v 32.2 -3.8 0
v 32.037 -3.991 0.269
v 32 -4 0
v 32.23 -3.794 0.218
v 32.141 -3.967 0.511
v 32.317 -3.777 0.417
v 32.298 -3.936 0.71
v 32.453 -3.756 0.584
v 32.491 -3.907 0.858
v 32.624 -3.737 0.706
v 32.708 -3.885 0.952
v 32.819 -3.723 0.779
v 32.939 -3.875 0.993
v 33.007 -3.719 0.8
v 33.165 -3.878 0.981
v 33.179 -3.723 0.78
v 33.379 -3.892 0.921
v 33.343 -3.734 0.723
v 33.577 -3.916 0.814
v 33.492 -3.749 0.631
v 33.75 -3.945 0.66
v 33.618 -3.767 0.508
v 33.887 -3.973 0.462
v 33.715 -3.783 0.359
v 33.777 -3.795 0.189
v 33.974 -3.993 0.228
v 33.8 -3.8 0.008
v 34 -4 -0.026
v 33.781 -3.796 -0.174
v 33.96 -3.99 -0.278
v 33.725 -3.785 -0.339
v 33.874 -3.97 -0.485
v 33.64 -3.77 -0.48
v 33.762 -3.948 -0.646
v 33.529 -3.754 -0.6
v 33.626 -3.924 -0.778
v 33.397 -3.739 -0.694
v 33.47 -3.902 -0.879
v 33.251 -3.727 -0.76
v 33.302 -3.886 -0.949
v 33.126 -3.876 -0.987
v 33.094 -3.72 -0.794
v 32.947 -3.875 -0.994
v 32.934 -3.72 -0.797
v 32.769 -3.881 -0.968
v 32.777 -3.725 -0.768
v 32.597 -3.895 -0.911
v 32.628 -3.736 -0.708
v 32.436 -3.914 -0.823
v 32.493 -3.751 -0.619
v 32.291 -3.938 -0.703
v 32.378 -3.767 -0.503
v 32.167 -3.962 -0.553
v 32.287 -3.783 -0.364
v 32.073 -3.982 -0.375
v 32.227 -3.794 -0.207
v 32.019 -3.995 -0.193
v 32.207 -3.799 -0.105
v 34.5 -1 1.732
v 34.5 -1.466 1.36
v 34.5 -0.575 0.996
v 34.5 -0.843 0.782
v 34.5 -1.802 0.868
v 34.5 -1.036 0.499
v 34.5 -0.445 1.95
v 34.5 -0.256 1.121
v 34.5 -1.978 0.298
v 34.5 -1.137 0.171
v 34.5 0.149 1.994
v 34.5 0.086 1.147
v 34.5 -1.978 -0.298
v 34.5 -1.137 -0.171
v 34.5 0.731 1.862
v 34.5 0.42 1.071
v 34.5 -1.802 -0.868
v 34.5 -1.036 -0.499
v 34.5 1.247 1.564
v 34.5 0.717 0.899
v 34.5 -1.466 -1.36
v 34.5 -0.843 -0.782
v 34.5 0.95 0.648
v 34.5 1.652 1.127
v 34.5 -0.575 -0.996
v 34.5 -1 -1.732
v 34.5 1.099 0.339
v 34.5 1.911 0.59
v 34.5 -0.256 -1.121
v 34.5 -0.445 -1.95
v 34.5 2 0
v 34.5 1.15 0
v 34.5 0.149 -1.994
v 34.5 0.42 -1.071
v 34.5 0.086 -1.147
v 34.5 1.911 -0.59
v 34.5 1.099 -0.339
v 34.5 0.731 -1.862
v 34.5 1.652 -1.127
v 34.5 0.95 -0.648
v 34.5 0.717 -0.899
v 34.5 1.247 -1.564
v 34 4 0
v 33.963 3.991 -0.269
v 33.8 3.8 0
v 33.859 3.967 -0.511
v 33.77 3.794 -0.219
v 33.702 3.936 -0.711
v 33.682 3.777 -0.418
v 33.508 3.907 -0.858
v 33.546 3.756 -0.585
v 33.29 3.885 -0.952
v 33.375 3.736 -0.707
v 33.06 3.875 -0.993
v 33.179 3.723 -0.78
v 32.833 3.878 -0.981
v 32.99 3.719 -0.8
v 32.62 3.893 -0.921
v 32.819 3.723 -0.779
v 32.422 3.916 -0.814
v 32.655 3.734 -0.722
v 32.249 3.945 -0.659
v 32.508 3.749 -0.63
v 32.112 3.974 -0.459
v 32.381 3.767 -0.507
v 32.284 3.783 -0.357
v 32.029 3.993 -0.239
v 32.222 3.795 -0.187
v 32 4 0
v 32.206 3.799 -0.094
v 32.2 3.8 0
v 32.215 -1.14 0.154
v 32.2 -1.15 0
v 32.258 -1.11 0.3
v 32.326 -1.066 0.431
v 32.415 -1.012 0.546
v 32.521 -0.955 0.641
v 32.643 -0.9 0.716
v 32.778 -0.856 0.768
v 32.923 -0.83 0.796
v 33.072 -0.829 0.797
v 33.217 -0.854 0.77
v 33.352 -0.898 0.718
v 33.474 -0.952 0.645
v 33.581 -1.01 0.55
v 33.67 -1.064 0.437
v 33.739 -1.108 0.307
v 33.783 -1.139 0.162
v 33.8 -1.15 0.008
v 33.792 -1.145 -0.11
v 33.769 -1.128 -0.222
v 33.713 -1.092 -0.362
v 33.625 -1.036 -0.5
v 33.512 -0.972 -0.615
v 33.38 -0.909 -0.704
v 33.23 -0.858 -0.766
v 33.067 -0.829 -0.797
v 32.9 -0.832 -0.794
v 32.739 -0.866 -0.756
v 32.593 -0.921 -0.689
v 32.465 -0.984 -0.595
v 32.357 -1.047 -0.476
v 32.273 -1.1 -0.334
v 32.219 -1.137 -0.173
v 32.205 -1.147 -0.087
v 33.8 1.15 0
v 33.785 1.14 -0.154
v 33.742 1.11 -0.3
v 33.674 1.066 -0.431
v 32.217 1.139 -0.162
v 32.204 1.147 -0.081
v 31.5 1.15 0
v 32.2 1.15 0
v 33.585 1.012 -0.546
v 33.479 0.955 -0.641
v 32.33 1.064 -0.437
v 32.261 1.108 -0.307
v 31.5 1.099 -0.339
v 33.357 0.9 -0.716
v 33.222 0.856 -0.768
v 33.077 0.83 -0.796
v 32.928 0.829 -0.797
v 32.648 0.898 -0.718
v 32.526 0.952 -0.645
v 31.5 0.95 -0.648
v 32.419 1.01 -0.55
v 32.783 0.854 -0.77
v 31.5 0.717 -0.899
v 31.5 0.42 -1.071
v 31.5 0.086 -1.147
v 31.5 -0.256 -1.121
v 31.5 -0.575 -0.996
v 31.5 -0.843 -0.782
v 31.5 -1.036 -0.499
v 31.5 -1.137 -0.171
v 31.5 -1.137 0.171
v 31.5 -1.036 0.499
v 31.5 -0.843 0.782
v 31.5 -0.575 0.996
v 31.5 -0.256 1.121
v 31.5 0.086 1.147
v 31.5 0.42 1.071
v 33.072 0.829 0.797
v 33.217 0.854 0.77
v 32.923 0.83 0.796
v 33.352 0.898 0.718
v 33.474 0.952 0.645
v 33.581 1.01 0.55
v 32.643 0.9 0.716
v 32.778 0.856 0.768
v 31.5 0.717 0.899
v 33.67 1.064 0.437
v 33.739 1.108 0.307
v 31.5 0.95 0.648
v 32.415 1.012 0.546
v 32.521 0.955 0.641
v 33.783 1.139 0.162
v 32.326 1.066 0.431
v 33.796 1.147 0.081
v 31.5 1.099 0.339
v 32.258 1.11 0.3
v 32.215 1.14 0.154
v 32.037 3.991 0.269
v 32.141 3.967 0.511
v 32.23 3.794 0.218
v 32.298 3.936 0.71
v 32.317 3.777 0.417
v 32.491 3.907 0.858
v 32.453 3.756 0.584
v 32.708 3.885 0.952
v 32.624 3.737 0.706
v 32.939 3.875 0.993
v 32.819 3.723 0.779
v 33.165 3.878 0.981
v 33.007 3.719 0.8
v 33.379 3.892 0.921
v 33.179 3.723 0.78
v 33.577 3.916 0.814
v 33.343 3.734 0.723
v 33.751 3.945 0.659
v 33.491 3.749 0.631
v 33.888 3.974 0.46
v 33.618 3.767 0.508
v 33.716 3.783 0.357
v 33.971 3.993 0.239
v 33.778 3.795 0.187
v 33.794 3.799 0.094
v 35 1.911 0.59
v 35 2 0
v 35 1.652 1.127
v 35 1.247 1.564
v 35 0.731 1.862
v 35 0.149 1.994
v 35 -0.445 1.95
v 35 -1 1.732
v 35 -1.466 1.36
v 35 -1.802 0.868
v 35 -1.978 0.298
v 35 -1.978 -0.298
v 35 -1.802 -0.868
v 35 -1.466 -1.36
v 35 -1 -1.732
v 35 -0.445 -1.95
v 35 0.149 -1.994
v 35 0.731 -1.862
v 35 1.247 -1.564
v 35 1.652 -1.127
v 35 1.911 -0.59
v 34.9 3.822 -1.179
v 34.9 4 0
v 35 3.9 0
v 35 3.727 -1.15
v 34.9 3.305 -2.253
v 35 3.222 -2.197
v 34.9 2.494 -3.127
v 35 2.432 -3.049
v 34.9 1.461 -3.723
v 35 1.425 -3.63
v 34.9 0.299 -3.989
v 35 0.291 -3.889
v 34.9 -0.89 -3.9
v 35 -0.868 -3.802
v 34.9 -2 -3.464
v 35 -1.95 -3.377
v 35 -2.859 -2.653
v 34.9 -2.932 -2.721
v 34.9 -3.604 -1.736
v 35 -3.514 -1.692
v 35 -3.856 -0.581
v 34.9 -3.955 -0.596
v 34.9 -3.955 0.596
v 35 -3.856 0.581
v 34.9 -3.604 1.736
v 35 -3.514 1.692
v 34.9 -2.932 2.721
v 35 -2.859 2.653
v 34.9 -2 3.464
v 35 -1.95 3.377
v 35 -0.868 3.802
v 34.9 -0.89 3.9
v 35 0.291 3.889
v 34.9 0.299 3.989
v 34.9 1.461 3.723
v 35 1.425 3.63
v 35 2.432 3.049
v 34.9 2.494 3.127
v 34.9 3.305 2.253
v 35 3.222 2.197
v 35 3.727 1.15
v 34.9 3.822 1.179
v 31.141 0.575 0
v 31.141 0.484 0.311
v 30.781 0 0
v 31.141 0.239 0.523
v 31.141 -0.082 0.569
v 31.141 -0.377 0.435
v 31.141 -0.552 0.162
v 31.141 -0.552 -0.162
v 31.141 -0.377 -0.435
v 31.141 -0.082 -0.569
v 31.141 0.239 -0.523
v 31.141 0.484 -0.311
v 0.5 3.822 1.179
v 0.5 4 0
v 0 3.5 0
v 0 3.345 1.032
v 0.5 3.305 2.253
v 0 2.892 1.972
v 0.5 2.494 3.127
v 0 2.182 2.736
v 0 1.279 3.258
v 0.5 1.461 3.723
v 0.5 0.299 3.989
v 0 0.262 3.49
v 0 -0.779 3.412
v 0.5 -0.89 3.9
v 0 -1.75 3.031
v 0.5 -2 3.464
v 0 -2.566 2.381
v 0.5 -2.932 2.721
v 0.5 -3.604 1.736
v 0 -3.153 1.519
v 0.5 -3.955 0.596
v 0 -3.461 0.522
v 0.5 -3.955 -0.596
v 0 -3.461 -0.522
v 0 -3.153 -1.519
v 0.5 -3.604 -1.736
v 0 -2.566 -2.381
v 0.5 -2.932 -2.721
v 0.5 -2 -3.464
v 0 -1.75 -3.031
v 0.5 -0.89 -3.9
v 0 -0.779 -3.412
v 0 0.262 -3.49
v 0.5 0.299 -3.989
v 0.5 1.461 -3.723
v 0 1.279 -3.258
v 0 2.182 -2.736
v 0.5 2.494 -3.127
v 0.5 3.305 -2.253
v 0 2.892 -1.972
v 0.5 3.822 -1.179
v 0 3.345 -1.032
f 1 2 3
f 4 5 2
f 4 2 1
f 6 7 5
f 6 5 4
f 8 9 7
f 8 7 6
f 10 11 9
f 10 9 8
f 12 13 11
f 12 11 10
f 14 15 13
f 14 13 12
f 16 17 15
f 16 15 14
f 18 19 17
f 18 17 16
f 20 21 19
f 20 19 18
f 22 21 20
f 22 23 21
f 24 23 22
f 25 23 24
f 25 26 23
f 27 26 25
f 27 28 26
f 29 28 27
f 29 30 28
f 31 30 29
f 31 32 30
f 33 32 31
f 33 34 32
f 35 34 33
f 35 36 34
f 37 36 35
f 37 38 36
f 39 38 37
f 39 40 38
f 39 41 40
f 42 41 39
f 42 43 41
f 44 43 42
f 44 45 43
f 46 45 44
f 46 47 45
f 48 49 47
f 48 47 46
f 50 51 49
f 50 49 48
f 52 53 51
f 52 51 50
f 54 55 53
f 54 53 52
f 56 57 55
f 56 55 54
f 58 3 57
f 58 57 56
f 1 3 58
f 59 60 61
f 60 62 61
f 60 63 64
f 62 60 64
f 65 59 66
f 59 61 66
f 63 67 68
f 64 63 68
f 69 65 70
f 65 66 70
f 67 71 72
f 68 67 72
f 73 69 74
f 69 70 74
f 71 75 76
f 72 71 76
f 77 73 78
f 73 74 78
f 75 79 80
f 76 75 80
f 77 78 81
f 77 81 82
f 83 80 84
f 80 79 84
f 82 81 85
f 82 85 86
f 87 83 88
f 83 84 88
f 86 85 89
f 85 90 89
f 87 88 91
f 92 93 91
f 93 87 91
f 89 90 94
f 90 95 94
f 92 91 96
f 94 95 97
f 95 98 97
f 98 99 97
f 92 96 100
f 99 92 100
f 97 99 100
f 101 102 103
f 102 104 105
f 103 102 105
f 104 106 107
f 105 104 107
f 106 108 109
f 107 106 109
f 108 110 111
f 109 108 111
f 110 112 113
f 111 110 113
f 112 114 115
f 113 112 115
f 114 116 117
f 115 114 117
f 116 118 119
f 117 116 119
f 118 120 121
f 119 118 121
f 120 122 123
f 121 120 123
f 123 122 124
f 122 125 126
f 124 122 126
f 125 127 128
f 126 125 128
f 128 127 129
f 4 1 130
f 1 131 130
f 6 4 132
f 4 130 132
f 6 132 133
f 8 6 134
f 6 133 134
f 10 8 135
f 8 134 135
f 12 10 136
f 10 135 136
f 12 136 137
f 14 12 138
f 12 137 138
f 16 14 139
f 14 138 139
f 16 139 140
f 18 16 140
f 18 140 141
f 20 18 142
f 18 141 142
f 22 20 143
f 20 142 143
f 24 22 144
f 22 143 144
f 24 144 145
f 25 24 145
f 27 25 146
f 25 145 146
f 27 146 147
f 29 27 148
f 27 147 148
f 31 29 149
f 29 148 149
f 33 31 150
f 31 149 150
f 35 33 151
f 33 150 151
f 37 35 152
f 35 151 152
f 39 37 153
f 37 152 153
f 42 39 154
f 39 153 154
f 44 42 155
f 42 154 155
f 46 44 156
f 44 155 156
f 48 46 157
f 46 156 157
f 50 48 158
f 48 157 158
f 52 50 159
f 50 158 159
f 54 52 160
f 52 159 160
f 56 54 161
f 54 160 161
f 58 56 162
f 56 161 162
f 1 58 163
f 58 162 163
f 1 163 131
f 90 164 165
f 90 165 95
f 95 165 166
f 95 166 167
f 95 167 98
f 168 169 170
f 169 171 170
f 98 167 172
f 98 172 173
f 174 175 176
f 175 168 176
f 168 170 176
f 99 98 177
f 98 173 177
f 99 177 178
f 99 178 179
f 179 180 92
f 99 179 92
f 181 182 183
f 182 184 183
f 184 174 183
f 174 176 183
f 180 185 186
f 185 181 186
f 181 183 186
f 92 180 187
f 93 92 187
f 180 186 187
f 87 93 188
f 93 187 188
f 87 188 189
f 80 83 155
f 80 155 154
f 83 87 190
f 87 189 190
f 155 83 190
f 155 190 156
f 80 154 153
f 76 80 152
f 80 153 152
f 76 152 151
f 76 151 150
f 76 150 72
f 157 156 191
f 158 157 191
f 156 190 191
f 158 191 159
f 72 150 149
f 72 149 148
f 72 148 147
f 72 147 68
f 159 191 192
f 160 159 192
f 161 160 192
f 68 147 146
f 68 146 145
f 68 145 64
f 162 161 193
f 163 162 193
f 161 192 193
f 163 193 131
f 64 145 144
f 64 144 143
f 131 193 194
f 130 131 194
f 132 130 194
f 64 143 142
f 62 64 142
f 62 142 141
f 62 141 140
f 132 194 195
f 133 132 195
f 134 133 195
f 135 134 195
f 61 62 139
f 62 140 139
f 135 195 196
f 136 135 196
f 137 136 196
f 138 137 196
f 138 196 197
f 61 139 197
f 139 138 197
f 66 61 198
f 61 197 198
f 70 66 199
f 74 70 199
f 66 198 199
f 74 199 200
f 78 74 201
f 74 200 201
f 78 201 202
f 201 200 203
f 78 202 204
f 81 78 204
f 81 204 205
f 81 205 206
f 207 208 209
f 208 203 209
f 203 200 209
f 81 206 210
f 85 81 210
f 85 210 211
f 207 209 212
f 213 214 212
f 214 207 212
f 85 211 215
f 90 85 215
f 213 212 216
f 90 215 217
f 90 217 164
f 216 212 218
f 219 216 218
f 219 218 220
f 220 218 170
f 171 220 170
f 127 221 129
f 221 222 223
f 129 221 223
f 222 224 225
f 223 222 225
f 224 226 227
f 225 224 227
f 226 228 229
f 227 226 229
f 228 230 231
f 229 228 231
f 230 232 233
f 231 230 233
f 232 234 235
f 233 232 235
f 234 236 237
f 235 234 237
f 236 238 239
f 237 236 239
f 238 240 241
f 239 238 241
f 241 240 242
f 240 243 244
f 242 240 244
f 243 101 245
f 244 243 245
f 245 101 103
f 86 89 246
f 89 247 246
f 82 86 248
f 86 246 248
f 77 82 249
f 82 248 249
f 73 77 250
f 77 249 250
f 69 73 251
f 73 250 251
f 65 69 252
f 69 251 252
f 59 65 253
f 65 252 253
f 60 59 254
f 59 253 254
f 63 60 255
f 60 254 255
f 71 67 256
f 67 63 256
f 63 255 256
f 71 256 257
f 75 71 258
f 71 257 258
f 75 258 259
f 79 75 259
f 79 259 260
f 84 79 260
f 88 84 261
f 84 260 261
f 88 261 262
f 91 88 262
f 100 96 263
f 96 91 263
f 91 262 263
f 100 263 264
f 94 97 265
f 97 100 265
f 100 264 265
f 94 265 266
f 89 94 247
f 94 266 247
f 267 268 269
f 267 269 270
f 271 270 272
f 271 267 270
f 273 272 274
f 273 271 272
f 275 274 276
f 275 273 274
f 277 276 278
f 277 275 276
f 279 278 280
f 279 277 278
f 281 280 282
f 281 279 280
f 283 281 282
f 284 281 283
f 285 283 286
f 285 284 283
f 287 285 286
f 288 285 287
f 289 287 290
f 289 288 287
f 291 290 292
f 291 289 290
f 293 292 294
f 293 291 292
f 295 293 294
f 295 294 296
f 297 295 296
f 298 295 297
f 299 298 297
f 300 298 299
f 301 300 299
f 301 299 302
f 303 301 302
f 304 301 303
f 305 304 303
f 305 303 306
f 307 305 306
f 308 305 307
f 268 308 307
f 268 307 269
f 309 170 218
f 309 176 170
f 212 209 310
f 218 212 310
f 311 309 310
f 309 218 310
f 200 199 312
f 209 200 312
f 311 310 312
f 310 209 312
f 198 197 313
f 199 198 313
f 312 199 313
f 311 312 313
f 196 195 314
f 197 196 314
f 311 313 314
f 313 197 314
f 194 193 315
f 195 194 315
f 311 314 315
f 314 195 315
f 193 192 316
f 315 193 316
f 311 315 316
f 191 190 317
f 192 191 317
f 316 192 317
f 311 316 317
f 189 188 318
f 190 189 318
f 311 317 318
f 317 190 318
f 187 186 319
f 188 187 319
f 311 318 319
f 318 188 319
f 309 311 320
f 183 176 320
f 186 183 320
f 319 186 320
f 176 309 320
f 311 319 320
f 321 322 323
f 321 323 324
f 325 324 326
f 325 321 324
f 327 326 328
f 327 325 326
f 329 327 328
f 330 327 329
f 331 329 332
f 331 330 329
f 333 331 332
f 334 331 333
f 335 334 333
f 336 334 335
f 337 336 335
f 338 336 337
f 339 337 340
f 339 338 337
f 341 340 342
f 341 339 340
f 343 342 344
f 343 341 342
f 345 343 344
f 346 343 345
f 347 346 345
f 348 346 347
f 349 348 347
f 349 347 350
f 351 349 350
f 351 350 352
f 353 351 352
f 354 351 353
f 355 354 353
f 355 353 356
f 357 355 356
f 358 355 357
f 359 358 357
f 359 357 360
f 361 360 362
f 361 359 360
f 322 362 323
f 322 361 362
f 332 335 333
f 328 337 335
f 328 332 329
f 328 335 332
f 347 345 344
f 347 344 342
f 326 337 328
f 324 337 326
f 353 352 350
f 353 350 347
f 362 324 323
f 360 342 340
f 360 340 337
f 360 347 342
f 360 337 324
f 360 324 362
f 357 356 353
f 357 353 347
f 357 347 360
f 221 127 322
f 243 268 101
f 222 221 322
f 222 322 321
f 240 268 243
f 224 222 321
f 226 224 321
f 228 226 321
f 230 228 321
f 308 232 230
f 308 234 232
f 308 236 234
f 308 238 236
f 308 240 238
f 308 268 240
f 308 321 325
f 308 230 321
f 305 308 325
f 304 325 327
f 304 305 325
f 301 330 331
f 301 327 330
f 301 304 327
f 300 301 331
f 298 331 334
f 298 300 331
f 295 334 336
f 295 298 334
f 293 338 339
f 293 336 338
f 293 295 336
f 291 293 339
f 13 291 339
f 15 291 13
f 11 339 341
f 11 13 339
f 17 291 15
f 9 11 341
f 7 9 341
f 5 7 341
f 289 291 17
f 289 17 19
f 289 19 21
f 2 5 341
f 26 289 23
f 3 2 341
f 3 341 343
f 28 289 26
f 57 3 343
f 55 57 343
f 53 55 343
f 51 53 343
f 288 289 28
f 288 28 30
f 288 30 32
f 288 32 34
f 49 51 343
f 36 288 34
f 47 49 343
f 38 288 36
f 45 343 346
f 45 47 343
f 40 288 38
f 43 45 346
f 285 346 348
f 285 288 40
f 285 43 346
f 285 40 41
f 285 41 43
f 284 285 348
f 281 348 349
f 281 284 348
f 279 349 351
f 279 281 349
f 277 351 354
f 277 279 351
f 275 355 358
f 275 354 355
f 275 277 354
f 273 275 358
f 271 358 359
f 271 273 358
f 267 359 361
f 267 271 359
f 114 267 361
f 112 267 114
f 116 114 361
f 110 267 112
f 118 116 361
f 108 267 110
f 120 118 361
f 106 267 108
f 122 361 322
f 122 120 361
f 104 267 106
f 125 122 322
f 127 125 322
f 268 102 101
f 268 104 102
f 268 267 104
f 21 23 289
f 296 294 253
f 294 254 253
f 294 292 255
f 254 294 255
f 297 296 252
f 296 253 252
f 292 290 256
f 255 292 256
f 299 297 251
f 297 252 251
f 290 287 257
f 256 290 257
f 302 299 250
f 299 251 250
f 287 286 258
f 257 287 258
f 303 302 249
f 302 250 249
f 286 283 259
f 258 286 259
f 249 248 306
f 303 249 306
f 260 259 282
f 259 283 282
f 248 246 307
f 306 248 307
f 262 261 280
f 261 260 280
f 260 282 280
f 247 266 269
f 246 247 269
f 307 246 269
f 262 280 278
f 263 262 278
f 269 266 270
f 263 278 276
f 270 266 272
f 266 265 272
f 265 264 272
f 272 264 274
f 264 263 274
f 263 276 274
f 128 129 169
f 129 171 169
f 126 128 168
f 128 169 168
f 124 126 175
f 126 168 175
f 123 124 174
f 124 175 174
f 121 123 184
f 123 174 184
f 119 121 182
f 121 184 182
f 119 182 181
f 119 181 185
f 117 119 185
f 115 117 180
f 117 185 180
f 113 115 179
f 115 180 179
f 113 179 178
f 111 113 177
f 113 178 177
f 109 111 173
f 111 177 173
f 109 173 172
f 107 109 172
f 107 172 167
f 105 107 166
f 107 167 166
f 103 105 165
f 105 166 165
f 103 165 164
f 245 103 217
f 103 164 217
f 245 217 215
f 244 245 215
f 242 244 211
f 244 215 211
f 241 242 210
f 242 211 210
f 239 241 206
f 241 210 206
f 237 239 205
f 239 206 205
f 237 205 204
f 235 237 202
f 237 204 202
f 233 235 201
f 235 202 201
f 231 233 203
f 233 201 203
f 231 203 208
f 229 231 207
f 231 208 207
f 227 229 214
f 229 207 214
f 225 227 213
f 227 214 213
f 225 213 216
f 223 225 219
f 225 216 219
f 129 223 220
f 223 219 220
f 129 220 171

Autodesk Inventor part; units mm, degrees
ref_plane "YZ Plane" through (0, 0, 0) normal (1, 0, 0) x (0, 1, 0)
ref_plane "XZ Plane" through (0, 0, 0) normal (0, 1, 0) x (-1, 0, 0)
ref_plane "XY Plane" through (0, 0, 0) normal (0, 0, 1) x (1, 0, 0)
sketch "Sketch1" plane through (0, 0, 0) normal (0, 0, 1) x (1, 0, 0)
  line L0 (0, 0) -> (0, 3)
  line L1 (0, 3) -> (15, 3)
  line L2 (15, 3) -> (15, 4)
  line L3 (15, 4) -> (35, 4)
  line L4 (35, 4) -> (35, 0)
  line L5 (35, 0) -> (0, 0)
  line L6 (34.5, 0) -> (34.5, 2)
  line L7 (34.5, 2) -> (35, 2)
  line L8 (34.5, 1.15) -> (31.5, 1.15)
  line L9 (31.5, 1.15) -> (30.7814, 0)
  line L10 (30.7814, 0) -> (34.5, 0)
  line L11 (15, 4) -> (0, 4)
  line L12 (0, 4) -> (0, 3)
  point P0 (0, 1.5)
  point P1 (35, 2)
  dimension "d0" = 3
  dimension "d1" = 4
  dimension "d2" = 15
  dimension "d3" = 35
  dimension "d4" = 2
  dimension "d5" = 0.5
  dimension "d27" = 1.15
  dimension "d28" = 58
  dimension "d29" = 3
revolve "Revolution1" add sketch "Sketch1" angle 360 about axis through (35, 0, 0) along (-1, 0, 0) contours L0 L1 L2 L3 L4 L7 L6 L8 L9 L5 | L12 L11 L2 L1
chamfer "Chamfer1" [suppressed]
chamfer "Chamfer2" distance 0.1 angle 45 1 edges at (35, -4, 0)
sketch "Sketch2" plane through (0, 0, 0) normal (0, 1, 0) x (-1, 0, 0)
  circle A0 centre (-33, 0) radius 0.8
  line L0 (-35, -2) -> (-35, 2) projected
  point P0 (0, 0)
  dimension "d13" = 1.6
  dimension "d14" = 2
extrude "Extrusion1" cut sketch "Sketch2" along normal mid plane 10
chamfer "Chamfer4" distance 0.2 angle 45 3 edges at (33, 3.9192, 0.8) (33.0001, 3.9192, -0.8) (33.8, -4, 0.001)
thread "Thread2" size "M1.6x0.35" class "6H" standard "ANSI Metric M Profile" length 5
thread "Thread3" size "M1.6x0.35" class "6H" standard "ANSI Metric M Profile" length 3
chamfer "Chamfer5" distance 0.5 angle 45 1 edges at (0, -4, 0)
properties part number "Sp mu SM holder"
